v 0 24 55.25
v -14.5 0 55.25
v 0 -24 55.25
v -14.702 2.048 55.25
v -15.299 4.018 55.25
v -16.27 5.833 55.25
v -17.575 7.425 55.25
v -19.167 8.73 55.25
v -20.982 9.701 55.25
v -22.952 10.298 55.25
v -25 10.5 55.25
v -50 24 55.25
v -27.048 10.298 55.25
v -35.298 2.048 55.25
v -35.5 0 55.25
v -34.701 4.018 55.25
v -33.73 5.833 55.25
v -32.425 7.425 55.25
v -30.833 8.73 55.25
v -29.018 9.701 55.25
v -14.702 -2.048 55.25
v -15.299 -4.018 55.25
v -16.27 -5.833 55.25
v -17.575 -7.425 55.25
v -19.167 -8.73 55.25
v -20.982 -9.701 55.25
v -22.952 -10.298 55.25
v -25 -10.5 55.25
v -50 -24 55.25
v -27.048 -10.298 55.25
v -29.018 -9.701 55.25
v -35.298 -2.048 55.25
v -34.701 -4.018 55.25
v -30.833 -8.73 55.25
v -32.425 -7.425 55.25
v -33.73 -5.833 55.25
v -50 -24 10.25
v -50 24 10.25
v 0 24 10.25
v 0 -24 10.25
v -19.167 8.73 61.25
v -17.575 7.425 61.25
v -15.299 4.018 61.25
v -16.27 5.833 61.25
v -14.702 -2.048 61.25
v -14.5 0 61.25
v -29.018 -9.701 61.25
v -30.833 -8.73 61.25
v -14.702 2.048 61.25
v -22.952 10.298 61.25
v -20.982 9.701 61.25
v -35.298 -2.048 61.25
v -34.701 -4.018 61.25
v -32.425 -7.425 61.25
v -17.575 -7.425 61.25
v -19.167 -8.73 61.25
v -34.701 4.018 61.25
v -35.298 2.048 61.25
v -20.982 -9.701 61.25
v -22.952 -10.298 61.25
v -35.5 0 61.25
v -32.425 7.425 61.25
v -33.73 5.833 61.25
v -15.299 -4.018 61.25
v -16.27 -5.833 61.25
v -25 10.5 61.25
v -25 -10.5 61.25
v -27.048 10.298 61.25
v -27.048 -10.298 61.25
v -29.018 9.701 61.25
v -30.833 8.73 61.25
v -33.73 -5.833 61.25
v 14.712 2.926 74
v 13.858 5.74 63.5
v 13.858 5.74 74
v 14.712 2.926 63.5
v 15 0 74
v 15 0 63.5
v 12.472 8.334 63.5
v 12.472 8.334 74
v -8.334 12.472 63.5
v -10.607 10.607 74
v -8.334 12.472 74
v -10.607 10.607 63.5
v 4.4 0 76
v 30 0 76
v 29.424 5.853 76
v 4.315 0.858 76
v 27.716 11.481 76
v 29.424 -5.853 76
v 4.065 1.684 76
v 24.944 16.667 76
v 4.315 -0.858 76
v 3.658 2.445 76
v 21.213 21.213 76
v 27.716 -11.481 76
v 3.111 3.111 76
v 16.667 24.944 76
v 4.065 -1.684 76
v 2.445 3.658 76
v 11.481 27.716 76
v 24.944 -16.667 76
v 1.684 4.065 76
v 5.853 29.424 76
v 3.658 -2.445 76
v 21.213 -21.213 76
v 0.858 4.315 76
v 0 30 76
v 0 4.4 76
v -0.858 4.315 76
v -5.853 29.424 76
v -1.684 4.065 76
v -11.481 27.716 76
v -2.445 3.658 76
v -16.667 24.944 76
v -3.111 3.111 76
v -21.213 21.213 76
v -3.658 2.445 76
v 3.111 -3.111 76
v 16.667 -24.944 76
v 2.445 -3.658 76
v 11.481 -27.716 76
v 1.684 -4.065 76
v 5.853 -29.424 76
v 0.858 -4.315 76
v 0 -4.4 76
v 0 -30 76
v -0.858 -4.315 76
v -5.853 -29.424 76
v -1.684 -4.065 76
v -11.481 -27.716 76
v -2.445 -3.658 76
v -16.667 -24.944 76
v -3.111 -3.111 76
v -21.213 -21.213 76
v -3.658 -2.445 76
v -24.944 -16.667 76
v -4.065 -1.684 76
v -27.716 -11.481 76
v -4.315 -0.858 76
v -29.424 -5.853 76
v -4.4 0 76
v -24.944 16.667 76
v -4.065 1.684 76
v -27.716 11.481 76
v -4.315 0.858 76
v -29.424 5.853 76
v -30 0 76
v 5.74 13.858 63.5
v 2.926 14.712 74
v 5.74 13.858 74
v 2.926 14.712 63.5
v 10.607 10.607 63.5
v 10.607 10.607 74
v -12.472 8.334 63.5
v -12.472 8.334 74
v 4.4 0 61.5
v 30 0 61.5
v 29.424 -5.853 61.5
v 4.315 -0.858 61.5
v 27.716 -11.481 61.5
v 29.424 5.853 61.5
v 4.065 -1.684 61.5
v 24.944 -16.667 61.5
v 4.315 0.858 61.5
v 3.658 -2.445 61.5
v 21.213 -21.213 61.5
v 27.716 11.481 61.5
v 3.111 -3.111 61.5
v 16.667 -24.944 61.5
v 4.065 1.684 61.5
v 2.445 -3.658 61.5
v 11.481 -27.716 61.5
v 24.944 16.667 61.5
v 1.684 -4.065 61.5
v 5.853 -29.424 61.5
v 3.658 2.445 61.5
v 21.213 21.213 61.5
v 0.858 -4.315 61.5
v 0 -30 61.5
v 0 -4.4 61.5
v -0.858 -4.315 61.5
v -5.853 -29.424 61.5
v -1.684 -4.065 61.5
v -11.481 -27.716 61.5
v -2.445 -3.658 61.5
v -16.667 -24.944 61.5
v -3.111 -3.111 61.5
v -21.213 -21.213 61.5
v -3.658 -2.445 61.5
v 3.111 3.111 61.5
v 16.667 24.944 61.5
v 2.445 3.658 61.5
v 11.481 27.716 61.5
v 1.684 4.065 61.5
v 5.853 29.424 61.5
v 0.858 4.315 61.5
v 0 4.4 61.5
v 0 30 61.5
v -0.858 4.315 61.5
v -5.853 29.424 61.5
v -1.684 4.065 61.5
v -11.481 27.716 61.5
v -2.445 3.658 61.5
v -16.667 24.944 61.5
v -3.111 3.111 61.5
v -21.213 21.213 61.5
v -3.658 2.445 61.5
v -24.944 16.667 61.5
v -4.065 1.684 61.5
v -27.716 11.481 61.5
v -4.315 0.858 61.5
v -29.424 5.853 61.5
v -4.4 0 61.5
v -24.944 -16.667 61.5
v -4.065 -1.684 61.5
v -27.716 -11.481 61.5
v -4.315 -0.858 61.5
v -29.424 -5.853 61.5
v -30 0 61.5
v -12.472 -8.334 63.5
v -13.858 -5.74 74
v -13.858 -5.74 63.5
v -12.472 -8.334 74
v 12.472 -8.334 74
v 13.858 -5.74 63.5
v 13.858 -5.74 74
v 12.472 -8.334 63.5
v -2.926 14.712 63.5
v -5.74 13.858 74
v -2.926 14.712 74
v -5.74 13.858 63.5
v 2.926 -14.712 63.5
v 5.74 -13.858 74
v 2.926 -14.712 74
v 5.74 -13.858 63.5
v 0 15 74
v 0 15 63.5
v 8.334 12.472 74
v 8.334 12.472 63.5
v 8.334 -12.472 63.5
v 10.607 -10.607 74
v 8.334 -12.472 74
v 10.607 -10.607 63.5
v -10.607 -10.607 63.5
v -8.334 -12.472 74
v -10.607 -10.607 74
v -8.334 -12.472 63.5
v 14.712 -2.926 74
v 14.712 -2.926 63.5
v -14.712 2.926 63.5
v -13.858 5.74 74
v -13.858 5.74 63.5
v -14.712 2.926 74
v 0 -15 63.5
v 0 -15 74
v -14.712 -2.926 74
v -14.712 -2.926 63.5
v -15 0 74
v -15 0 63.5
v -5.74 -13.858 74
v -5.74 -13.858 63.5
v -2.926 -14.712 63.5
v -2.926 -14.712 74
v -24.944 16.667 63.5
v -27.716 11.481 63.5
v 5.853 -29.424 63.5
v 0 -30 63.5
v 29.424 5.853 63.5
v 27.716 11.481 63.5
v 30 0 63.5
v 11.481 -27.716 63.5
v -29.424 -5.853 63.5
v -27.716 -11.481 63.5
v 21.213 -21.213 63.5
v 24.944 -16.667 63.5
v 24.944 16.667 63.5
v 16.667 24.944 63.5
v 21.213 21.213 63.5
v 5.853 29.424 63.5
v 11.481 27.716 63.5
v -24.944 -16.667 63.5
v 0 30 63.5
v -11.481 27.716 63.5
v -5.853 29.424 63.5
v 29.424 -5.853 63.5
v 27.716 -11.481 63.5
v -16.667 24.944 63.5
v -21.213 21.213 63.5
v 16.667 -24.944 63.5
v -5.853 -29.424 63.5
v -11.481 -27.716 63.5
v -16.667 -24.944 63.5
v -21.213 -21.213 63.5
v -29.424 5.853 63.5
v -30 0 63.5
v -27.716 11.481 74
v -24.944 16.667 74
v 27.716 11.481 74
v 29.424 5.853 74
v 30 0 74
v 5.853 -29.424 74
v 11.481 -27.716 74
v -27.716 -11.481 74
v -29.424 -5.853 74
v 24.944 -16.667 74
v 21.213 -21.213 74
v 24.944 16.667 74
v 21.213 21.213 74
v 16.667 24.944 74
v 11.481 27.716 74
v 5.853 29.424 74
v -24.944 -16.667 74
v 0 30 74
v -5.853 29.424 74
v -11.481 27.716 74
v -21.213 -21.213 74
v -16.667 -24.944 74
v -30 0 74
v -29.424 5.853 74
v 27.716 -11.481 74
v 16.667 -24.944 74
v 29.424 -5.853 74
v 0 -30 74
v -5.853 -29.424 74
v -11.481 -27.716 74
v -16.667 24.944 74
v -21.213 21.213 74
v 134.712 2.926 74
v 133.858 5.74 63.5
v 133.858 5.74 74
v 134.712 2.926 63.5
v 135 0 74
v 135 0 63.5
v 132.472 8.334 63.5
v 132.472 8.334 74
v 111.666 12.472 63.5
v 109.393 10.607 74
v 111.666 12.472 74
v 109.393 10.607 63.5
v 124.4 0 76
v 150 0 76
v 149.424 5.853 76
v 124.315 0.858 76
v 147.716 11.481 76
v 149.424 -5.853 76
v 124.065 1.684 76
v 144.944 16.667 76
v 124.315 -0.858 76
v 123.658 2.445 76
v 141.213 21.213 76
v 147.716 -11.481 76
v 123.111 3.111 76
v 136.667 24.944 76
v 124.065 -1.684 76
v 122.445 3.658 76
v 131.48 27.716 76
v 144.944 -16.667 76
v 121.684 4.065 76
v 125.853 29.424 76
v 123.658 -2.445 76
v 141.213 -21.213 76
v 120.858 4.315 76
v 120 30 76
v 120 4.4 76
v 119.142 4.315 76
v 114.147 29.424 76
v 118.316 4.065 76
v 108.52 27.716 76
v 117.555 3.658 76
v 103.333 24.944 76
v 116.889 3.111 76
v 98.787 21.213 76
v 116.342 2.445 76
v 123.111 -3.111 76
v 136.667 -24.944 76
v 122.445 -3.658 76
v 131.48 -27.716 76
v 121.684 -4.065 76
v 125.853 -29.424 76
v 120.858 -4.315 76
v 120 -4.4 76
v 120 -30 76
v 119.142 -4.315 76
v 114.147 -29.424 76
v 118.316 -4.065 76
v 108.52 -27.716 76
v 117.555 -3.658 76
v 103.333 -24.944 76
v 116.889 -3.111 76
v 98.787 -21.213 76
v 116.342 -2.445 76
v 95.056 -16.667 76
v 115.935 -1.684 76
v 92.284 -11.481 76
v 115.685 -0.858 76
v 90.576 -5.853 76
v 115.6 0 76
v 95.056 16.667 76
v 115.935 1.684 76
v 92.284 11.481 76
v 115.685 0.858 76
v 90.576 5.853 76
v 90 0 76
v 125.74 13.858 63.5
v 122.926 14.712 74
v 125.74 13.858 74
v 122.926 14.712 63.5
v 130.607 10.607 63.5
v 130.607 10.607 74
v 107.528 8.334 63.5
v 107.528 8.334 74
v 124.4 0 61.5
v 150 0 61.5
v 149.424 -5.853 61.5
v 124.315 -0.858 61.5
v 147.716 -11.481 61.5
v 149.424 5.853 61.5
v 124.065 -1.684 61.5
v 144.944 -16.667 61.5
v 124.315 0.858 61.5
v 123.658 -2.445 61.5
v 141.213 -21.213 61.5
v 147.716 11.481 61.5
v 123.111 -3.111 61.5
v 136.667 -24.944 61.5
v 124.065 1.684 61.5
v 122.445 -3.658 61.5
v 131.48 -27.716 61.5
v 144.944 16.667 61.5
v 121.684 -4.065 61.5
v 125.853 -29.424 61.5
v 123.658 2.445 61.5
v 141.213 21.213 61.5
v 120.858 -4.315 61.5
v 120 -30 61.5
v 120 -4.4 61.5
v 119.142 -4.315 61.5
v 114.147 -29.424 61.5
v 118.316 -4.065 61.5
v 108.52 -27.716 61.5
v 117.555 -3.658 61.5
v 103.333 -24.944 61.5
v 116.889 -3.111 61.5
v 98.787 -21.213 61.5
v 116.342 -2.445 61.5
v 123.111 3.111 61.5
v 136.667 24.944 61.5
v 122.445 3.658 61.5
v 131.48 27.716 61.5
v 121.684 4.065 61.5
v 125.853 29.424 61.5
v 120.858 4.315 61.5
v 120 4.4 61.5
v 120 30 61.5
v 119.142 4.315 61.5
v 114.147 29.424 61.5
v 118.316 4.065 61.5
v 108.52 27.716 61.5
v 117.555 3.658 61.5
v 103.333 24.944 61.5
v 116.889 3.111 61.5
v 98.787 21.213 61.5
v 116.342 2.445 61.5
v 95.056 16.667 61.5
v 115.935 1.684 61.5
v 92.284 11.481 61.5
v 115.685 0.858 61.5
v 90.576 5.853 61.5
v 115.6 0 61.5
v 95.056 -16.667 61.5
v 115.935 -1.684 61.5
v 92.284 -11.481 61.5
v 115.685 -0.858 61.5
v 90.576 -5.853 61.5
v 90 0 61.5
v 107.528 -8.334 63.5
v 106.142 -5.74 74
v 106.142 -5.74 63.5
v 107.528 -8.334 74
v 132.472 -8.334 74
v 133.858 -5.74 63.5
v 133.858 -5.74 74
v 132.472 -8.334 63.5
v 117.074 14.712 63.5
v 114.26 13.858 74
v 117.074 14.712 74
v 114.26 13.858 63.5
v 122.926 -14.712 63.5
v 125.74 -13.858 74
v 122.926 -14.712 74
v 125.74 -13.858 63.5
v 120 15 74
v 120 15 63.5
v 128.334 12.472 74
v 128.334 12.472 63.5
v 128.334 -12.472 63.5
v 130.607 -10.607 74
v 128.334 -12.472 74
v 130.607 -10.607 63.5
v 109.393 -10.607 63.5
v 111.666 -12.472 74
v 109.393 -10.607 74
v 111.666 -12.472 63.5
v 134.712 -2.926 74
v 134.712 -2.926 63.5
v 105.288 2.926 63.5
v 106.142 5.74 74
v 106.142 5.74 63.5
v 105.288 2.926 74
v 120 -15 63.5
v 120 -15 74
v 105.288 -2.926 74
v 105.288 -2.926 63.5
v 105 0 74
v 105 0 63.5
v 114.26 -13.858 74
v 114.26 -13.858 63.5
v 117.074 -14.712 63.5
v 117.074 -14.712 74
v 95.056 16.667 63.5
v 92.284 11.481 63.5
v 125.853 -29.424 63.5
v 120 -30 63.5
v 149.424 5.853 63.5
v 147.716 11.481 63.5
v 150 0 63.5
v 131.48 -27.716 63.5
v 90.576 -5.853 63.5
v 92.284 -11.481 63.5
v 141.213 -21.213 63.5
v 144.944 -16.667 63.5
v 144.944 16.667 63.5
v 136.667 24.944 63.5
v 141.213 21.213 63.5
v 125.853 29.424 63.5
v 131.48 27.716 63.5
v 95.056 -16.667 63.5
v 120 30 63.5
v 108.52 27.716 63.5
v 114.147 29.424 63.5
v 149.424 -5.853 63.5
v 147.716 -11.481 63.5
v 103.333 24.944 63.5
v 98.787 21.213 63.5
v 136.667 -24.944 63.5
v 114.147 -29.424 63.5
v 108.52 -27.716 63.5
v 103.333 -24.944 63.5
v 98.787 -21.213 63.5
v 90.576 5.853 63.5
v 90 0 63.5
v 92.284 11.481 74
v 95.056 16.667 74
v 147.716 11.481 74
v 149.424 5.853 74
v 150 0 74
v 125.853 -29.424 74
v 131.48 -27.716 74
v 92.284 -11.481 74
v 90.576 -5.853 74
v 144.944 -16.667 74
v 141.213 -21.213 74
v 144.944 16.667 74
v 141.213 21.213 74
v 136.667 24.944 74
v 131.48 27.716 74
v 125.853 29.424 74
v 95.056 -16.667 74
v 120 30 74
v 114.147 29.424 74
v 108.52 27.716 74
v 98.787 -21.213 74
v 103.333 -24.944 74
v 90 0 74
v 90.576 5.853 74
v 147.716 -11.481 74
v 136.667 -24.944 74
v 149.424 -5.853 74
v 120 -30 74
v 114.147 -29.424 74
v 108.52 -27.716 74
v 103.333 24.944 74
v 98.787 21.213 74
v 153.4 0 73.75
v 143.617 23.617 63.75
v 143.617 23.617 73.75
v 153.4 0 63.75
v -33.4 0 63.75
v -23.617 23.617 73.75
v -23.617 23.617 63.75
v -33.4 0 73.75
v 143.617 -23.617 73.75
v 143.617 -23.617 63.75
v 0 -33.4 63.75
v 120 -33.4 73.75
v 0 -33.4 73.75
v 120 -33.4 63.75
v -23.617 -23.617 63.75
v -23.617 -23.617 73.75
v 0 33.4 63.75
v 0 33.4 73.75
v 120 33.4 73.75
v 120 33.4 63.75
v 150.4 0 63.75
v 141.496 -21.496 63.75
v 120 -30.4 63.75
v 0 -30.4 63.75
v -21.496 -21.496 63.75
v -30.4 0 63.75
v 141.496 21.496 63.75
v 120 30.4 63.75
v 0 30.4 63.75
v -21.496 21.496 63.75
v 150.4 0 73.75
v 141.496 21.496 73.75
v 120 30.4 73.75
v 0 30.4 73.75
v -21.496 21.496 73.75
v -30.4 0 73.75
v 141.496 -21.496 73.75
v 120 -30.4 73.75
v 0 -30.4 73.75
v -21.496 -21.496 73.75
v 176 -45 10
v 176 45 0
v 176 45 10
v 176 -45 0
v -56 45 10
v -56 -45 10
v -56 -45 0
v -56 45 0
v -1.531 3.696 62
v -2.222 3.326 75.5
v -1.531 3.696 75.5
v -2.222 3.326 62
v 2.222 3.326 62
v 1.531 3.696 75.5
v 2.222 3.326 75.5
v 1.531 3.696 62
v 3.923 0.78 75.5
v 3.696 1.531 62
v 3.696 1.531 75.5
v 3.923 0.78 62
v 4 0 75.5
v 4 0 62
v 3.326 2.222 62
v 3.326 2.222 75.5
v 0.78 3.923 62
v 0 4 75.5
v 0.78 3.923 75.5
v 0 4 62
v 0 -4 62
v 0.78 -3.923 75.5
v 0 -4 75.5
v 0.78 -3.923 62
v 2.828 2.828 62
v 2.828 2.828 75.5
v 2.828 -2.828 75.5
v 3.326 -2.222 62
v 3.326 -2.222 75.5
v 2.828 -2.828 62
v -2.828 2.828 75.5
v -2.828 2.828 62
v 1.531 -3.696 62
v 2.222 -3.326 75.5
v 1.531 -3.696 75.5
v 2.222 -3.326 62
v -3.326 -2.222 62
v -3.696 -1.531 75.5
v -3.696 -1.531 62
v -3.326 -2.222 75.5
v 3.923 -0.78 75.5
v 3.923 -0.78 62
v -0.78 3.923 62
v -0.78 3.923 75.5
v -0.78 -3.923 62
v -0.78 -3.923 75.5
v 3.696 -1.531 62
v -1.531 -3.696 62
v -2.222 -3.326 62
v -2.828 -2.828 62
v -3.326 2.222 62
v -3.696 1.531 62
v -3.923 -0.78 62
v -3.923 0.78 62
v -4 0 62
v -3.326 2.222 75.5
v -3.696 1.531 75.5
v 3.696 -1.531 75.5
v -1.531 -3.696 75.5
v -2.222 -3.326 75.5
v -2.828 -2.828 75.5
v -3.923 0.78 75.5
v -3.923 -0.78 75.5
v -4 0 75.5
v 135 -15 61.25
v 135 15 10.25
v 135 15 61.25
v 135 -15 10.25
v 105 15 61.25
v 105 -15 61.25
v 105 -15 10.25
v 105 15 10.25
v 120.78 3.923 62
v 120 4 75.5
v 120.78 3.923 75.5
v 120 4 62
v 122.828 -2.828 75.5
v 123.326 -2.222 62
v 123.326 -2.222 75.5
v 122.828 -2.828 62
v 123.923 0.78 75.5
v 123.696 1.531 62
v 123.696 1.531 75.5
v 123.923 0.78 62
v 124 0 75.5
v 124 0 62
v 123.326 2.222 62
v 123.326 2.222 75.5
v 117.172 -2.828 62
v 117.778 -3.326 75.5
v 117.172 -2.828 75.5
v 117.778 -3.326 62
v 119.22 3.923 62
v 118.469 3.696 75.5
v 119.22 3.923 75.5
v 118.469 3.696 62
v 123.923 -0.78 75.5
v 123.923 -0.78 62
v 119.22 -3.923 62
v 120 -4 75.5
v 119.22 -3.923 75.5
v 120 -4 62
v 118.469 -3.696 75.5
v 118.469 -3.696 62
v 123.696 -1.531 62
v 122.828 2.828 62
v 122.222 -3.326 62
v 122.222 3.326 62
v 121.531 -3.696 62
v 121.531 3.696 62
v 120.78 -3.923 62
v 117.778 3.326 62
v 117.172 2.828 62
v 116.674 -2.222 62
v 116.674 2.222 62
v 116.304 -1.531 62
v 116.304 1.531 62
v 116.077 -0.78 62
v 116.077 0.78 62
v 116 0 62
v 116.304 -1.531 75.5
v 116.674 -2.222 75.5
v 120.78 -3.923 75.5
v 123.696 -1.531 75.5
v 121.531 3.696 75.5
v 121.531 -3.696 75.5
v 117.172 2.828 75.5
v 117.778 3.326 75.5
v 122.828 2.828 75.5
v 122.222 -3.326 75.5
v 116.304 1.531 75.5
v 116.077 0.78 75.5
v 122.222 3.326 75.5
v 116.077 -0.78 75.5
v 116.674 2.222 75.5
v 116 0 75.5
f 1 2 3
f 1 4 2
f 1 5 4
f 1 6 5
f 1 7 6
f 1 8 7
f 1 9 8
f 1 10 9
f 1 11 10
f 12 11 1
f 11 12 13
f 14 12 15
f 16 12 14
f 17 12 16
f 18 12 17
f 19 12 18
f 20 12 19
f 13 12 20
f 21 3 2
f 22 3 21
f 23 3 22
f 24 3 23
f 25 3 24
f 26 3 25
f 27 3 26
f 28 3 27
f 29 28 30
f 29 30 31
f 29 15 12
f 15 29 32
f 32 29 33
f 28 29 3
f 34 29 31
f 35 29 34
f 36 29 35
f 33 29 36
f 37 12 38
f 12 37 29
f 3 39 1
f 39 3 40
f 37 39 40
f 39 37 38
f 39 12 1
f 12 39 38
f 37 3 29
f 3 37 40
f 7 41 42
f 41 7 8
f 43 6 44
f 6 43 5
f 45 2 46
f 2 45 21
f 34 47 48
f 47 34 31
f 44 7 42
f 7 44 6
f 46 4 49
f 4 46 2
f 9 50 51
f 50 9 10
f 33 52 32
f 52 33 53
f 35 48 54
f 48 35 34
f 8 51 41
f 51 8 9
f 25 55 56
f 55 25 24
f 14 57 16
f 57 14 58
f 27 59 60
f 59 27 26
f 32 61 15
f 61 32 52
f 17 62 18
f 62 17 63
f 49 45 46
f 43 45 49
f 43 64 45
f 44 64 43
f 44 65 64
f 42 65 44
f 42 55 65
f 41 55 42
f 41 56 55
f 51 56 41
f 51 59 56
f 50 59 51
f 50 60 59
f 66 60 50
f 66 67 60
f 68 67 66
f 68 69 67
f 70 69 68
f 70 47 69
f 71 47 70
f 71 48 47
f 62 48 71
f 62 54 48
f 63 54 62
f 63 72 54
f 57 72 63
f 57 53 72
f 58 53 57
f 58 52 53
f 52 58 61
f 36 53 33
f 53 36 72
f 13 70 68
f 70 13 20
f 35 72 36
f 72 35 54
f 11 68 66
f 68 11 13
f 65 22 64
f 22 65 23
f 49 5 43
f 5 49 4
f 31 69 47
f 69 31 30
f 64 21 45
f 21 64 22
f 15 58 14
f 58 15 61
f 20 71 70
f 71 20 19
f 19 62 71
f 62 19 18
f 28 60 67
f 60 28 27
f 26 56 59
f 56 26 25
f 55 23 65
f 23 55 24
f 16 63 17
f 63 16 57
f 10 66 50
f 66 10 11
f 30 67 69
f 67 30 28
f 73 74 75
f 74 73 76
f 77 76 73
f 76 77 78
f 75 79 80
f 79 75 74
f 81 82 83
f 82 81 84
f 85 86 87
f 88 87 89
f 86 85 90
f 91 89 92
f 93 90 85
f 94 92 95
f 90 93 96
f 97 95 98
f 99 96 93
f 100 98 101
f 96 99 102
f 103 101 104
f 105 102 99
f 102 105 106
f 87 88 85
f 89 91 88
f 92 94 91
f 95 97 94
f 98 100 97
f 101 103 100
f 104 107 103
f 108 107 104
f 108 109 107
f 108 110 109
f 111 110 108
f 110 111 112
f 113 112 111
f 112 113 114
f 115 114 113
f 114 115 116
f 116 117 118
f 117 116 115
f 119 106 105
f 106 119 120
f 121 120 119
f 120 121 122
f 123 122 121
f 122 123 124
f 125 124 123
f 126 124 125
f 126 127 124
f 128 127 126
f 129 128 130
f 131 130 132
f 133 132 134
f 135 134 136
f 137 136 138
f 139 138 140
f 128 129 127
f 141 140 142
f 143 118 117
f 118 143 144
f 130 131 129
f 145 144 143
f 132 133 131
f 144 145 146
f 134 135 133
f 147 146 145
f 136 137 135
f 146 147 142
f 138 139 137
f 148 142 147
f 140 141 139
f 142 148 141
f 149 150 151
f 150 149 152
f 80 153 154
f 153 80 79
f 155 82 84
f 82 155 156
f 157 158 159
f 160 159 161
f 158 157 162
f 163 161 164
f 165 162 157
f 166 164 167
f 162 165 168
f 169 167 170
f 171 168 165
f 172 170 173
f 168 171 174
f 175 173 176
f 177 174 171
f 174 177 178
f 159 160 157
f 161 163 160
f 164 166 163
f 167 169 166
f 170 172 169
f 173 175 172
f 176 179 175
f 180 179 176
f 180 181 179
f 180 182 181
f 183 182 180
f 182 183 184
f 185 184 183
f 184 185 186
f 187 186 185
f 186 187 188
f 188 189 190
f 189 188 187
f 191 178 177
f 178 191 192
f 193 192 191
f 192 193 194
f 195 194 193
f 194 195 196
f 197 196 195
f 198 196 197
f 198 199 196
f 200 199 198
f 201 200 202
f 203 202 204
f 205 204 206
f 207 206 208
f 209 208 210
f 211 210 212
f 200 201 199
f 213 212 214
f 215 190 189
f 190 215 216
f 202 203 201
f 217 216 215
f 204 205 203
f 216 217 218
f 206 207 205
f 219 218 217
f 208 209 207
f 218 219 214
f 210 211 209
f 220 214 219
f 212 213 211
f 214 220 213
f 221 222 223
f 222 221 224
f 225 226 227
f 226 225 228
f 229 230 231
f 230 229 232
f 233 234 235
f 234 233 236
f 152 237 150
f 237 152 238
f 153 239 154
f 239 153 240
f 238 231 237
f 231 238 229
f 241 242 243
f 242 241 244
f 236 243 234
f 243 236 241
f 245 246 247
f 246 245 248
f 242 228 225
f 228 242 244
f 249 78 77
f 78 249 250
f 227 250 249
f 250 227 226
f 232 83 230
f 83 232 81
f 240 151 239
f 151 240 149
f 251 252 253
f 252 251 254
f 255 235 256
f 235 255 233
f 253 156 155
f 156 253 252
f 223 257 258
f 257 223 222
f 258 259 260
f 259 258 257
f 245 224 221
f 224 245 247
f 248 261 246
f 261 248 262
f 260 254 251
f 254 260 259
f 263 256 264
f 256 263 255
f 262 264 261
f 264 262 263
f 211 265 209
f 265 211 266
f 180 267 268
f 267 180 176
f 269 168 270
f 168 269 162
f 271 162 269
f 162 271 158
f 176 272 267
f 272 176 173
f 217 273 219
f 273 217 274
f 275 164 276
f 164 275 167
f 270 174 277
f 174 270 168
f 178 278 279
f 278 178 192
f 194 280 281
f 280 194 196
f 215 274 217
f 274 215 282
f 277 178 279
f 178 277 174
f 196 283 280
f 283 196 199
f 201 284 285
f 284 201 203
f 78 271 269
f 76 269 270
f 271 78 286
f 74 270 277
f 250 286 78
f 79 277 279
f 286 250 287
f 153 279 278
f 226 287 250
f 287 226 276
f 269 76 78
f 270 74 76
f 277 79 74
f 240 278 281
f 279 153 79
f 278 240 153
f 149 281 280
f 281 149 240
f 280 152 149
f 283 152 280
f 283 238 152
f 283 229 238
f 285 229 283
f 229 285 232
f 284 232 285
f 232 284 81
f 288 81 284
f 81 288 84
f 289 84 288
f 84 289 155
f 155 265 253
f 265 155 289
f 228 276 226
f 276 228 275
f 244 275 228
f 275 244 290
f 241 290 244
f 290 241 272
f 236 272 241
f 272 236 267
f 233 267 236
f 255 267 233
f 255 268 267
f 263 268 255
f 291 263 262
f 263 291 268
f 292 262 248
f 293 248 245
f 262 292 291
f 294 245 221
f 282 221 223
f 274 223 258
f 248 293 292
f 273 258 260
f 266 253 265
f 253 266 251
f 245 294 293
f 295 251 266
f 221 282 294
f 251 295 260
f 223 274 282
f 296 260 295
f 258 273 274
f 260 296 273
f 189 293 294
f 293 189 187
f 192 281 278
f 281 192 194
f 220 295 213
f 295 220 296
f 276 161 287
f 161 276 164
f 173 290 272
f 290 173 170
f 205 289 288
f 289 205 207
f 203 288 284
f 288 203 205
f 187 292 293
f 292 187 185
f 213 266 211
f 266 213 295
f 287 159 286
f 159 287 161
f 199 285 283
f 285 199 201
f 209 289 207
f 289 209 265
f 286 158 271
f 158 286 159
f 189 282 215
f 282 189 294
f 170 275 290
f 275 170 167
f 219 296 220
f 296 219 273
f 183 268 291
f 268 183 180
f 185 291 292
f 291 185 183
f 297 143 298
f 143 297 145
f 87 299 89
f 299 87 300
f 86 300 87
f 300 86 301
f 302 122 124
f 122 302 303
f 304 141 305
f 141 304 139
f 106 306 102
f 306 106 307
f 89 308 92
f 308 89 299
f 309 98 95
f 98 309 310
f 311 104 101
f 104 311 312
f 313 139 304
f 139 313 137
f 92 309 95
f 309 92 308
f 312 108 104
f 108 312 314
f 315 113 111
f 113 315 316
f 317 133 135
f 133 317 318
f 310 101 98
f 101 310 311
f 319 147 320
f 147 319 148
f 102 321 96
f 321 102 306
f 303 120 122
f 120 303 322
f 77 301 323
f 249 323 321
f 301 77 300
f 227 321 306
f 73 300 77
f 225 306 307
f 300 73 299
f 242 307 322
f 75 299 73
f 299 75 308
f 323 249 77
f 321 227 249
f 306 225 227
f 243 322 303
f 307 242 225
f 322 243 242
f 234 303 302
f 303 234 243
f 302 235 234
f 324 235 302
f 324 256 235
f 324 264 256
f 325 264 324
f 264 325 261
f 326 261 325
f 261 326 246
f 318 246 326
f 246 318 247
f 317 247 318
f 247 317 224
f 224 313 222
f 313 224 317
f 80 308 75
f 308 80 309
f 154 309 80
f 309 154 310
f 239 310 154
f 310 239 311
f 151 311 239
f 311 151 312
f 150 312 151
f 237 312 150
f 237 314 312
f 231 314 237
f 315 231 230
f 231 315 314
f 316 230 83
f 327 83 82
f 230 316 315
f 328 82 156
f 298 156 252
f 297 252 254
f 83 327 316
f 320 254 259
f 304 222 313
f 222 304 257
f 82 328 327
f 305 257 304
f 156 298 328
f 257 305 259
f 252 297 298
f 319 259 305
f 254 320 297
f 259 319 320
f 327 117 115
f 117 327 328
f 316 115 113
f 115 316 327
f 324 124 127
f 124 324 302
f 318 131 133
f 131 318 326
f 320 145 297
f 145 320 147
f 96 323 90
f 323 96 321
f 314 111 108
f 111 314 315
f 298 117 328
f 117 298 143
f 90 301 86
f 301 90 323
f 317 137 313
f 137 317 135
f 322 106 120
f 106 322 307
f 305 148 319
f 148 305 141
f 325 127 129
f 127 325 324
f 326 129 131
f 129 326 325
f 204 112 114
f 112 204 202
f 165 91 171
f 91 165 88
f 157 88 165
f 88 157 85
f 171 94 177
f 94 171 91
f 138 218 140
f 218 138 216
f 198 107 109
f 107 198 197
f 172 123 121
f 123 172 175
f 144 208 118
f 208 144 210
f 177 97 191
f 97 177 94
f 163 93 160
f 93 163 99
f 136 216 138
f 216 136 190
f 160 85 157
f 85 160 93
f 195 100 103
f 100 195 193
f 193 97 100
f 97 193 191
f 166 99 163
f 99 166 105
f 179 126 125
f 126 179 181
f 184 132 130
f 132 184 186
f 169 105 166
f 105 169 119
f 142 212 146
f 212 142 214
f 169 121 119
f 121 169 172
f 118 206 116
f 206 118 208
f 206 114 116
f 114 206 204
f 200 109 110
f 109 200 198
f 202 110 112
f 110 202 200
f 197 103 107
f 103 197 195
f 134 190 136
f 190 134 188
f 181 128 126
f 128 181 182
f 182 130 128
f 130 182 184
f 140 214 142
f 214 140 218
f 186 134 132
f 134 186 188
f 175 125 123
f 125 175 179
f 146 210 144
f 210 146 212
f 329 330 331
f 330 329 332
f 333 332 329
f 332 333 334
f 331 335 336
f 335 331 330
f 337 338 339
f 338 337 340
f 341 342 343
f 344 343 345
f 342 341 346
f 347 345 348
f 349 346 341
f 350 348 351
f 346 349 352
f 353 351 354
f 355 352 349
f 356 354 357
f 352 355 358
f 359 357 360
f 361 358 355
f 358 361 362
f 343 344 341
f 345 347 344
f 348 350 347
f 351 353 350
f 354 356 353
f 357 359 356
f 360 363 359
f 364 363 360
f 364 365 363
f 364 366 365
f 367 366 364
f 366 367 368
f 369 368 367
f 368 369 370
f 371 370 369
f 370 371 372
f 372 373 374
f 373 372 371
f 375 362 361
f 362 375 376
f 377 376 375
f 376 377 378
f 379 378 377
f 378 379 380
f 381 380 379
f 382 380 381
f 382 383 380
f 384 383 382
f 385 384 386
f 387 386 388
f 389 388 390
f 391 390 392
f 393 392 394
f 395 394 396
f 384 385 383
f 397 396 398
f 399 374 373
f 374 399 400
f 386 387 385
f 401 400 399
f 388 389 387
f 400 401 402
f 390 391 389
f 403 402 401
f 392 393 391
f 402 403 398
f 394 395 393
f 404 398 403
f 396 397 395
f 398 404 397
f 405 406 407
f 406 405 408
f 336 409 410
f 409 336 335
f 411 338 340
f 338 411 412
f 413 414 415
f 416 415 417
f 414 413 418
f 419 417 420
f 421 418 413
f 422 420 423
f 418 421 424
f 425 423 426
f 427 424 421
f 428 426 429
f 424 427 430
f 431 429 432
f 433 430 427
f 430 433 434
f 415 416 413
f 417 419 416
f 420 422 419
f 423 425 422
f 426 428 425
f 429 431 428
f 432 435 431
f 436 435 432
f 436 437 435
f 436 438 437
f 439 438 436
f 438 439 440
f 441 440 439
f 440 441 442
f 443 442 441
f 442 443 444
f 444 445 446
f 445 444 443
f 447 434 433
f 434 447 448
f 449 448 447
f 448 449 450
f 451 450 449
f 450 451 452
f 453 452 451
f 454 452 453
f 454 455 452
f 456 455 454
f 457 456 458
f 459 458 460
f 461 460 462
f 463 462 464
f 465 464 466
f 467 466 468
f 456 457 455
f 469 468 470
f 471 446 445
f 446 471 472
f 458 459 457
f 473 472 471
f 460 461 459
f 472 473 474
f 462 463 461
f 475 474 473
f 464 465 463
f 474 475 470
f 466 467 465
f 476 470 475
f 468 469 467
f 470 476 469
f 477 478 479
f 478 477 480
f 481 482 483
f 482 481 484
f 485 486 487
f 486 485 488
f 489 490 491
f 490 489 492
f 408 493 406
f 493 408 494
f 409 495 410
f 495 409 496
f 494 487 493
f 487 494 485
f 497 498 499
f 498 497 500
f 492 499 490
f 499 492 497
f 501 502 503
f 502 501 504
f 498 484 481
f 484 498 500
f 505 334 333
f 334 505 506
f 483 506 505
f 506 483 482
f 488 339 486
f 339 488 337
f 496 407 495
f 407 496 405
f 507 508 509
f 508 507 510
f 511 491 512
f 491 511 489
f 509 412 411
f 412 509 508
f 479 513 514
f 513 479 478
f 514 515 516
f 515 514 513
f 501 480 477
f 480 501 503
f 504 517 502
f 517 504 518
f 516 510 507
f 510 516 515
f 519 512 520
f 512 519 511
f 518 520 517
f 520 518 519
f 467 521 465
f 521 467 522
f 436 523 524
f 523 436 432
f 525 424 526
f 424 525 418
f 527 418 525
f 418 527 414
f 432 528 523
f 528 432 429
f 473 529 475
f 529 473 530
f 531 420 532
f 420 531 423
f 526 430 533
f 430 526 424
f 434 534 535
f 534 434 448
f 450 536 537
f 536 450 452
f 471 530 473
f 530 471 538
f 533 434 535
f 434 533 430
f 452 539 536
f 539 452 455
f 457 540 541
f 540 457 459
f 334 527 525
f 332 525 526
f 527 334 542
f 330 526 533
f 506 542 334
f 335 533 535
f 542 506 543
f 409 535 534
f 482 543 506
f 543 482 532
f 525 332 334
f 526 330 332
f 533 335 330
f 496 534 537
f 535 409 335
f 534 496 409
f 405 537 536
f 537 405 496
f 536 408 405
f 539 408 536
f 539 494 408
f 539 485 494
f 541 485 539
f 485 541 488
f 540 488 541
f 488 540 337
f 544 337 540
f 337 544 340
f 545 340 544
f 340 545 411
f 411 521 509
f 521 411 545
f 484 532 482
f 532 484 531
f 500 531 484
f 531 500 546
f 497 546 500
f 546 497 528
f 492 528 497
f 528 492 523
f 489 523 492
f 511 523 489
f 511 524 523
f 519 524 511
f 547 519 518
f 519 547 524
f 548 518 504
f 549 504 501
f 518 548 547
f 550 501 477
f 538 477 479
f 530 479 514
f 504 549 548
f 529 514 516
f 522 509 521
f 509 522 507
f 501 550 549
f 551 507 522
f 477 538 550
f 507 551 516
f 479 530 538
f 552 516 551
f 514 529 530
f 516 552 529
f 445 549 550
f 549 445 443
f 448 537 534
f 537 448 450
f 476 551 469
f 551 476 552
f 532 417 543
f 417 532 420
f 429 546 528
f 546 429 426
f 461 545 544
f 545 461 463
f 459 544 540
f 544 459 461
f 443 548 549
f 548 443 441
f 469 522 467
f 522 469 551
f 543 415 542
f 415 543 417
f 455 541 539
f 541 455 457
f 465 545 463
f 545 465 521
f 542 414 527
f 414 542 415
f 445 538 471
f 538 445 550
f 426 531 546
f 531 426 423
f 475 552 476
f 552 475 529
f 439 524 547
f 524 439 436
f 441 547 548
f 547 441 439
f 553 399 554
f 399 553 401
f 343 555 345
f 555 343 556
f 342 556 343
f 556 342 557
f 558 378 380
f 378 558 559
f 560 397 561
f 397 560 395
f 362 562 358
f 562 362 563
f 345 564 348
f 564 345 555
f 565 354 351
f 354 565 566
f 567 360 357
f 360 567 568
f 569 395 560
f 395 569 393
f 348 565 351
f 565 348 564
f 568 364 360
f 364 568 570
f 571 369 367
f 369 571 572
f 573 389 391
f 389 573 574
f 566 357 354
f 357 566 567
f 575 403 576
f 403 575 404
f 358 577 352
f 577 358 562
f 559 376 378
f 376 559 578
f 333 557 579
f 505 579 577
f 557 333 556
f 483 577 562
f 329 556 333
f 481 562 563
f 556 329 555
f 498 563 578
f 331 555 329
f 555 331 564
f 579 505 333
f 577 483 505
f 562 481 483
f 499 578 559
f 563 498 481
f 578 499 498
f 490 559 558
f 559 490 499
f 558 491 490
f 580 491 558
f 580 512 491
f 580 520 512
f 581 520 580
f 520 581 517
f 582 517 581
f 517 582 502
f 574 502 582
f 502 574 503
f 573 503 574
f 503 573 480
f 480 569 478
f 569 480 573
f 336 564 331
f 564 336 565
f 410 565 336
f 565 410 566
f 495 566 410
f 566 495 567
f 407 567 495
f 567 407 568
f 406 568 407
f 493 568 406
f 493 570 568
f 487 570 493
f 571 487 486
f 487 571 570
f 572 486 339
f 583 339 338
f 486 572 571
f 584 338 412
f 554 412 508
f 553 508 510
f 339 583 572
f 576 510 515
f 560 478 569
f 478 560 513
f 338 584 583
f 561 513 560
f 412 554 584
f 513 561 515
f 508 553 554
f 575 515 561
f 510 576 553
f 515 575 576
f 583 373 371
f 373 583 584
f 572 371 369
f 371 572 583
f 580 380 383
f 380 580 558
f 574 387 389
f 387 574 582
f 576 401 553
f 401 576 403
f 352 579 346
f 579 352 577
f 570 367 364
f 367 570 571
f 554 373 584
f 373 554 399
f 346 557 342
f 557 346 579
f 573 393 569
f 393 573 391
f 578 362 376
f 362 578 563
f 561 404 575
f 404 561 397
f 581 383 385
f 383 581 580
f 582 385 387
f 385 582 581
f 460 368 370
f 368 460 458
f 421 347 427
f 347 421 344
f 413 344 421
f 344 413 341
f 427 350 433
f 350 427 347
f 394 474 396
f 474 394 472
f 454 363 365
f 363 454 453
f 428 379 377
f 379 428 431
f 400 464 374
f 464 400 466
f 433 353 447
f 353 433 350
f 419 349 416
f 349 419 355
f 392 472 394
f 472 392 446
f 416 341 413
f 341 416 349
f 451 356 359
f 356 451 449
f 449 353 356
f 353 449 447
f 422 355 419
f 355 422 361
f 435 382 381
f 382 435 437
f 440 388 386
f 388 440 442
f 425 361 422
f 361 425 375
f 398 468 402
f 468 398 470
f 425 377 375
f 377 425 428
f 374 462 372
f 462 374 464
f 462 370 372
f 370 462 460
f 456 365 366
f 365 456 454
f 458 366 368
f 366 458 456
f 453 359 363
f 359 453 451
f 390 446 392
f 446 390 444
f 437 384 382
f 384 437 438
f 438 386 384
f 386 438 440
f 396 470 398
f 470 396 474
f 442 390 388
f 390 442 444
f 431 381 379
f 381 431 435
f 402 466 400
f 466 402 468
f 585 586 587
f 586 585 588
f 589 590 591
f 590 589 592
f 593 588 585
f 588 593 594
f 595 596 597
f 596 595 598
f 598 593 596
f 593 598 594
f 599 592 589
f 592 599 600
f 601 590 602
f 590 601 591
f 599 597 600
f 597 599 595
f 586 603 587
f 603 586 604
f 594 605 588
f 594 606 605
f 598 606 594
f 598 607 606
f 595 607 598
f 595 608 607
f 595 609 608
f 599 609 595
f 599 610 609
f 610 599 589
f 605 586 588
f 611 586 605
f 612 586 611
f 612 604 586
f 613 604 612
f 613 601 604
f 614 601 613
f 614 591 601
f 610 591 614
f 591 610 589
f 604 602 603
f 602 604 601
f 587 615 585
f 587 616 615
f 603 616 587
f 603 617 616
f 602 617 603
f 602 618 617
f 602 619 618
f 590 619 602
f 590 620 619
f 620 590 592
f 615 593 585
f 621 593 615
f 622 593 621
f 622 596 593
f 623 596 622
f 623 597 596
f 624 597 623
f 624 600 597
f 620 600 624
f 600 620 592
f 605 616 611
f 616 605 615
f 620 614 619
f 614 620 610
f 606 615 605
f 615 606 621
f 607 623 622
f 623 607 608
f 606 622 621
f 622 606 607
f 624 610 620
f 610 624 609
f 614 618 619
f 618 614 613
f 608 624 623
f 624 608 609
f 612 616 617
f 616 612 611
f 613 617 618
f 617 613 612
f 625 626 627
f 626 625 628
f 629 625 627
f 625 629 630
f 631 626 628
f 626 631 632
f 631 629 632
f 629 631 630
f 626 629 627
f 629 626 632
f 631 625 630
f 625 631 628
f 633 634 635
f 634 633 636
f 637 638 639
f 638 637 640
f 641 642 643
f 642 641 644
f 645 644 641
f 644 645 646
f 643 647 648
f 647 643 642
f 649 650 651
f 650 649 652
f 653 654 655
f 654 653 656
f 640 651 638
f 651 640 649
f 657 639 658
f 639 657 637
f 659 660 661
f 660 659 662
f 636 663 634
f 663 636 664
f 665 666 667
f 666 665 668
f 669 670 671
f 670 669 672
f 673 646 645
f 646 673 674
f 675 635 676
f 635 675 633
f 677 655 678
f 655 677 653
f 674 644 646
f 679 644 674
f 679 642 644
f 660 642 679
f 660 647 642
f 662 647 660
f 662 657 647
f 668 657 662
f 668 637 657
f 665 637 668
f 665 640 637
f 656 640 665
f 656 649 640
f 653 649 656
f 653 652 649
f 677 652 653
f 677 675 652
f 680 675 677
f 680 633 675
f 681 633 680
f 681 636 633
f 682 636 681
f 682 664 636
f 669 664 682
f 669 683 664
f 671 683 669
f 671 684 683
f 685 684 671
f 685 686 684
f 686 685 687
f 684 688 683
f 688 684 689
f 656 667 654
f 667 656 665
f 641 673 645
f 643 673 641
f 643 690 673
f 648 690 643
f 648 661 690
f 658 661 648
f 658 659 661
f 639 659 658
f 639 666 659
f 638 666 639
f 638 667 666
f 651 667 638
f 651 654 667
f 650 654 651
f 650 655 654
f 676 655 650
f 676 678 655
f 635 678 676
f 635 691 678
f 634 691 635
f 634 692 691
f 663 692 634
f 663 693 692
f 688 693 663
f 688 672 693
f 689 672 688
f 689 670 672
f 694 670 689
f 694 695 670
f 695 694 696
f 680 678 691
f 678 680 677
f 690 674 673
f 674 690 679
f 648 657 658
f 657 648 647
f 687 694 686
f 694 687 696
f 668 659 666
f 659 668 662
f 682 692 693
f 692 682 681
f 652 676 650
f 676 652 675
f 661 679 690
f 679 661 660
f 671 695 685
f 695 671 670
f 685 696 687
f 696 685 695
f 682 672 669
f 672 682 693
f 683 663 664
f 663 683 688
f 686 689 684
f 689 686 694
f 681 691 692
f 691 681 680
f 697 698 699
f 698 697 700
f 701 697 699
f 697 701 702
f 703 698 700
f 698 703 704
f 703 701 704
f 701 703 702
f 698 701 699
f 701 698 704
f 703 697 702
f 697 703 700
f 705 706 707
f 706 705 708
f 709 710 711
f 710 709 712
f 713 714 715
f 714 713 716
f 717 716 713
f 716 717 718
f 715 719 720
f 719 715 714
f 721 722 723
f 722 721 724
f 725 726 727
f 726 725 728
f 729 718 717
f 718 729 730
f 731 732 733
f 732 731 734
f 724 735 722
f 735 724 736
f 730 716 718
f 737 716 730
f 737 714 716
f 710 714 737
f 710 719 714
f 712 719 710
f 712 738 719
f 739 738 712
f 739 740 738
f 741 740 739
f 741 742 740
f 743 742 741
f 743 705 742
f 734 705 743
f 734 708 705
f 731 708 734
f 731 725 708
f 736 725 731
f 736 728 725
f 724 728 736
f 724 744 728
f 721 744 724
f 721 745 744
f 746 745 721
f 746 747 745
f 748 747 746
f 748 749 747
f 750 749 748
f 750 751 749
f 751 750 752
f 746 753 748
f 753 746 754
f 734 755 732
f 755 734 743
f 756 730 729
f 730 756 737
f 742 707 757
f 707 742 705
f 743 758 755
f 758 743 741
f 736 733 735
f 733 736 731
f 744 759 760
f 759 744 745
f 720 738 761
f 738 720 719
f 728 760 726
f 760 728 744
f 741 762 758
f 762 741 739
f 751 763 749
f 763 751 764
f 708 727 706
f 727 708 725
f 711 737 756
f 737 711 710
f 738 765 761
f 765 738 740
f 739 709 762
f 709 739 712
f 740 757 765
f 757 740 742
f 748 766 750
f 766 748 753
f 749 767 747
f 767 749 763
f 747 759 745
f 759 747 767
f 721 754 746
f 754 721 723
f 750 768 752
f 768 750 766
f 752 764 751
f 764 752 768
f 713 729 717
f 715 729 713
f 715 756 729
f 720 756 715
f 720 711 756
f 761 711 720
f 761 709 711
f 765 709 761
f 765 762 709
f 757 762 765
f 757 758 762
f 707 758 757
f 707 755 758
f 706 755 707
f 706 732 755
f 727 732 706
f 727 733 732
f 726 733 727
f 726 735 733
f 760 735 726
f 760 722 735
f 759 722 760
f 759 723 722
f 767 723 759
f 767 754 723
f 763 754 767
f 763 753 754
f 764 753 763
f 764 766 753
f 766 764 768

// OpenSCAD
$fn = 32;

// ------------------------------------------------------------------------
// Motor belt drive: span 120 mm, pulleys d60, belt 10 mm wide
// Every part is its own module, assembly() places every instance.
// ------------------------------------------------------------------------

// --- part 1 ---
module base_plate() {
  difference() {
    translate([-116, -45, 0]) cube([232, 90, 10]);
  }
}

// --- part 2 ---
module motor() {
  union() {
    translate([-22.5, -24, 0]) cube([45, 48, 50]);
    translate([25.5, 0, 25]) rotate([0, 90, 0]) cylinder(h = 6, d = 21, center = true);
  }
}

// --- part 3 ---
module drive_shaft() {
  translate([0, 0, -6.75]) cylinder(h = 13.5, d = 8);
}

// --- part 4 ---
module pulley_drive() {
  difference() {
    union() {
      cylinder(h = 14.5, d = 30);
      cylinder(h = 2, d = 60);
      translate([0, 0, 12.5]) cylinder(h = 2, d = 60);
    }
    translate([0, 0, -1]) cylinder(h = 16.5, d = 8.8);
  }
}

// --- part 5 ---
module idler_post() {
  translate([-15, -15, 0]) cube([30, 30, 51]);
}

// --- part 6 ---
module driven_shaft() {
  translate([0, 0, -6.75]) cylinder(h = 13.5, d = 8);
}

// --- part 7 ---
module pulley_driven() {
  difference() {
    union() {
      cylinder(h = 14.5, d = 30);
      cylinder(h = 2, d = 60);
      translate([0, 0, 12.5]) cylinder(h = 2, d = 60);
    }
    translate([0, 0, -1]) cylinder(h = 16.5, d = 8.8);
  }
}

// --- part 8 ---
module drive_belt() {
  difference() {
    linear_extrude(height = 10) polygon(points = concat([for (a = [90 : 45 : 270]) [33.4 * cos(a), 33.4 * sin(a)]], [for (a = [270 : 45 : 450]) [120 + 33.4 * cos(a), 33.4 * sin(a)]]));
    translate([0, 0, -1]) linear_extrude(height = 12) polygon(points = concat([for (a = [90 : 45 : 270]) [30.4 * cos(a), 30.4 * sin(a)]], [for (a = [270 : 45 : 450]) [120 + 30.4 * cos(a), 30.4 * sin(a)]]));
  }
}

// --- assembly ---
module assembly() {
  color([0.80, 0.24, 0.20]) translate([60, 0, 0]) rotate([0, 0, 0]) base_plate();
  color([0.20, 0.45, 0.75]) translate([0, 0, 32.75]) rotate([0, 270, 0]) motor();
  color([0.25, 0.62, 0.32]) translate([0, 0, 68.75]) rotate([0, 0, 0]) drive_shaft();
  color([0.92, 0.70, 0.18]) translate([0, 0, 61.5]) rotate([0, 0, 0]) pulley_drive();
  color([0.58, 0.35, 0.70]) translate([120, 0, 10.25]) rotate([0, 0, 0]) idler_post();
  color([0.16, 0.66, 0.66]) translate([120, 0, 68.75]) rotate([0, 0, 0]) driven_shaft();
  color([0.85, 0.48, 0.18]) translate([120, 0, 61.5]) rotate([0, 0, 0]) pulley_driven();
  color([0.55, 0.60, 0.65]) translate([0, 0, 63.75]) rotate([0, 0, 0]) drive_belt();
}

assembly();
